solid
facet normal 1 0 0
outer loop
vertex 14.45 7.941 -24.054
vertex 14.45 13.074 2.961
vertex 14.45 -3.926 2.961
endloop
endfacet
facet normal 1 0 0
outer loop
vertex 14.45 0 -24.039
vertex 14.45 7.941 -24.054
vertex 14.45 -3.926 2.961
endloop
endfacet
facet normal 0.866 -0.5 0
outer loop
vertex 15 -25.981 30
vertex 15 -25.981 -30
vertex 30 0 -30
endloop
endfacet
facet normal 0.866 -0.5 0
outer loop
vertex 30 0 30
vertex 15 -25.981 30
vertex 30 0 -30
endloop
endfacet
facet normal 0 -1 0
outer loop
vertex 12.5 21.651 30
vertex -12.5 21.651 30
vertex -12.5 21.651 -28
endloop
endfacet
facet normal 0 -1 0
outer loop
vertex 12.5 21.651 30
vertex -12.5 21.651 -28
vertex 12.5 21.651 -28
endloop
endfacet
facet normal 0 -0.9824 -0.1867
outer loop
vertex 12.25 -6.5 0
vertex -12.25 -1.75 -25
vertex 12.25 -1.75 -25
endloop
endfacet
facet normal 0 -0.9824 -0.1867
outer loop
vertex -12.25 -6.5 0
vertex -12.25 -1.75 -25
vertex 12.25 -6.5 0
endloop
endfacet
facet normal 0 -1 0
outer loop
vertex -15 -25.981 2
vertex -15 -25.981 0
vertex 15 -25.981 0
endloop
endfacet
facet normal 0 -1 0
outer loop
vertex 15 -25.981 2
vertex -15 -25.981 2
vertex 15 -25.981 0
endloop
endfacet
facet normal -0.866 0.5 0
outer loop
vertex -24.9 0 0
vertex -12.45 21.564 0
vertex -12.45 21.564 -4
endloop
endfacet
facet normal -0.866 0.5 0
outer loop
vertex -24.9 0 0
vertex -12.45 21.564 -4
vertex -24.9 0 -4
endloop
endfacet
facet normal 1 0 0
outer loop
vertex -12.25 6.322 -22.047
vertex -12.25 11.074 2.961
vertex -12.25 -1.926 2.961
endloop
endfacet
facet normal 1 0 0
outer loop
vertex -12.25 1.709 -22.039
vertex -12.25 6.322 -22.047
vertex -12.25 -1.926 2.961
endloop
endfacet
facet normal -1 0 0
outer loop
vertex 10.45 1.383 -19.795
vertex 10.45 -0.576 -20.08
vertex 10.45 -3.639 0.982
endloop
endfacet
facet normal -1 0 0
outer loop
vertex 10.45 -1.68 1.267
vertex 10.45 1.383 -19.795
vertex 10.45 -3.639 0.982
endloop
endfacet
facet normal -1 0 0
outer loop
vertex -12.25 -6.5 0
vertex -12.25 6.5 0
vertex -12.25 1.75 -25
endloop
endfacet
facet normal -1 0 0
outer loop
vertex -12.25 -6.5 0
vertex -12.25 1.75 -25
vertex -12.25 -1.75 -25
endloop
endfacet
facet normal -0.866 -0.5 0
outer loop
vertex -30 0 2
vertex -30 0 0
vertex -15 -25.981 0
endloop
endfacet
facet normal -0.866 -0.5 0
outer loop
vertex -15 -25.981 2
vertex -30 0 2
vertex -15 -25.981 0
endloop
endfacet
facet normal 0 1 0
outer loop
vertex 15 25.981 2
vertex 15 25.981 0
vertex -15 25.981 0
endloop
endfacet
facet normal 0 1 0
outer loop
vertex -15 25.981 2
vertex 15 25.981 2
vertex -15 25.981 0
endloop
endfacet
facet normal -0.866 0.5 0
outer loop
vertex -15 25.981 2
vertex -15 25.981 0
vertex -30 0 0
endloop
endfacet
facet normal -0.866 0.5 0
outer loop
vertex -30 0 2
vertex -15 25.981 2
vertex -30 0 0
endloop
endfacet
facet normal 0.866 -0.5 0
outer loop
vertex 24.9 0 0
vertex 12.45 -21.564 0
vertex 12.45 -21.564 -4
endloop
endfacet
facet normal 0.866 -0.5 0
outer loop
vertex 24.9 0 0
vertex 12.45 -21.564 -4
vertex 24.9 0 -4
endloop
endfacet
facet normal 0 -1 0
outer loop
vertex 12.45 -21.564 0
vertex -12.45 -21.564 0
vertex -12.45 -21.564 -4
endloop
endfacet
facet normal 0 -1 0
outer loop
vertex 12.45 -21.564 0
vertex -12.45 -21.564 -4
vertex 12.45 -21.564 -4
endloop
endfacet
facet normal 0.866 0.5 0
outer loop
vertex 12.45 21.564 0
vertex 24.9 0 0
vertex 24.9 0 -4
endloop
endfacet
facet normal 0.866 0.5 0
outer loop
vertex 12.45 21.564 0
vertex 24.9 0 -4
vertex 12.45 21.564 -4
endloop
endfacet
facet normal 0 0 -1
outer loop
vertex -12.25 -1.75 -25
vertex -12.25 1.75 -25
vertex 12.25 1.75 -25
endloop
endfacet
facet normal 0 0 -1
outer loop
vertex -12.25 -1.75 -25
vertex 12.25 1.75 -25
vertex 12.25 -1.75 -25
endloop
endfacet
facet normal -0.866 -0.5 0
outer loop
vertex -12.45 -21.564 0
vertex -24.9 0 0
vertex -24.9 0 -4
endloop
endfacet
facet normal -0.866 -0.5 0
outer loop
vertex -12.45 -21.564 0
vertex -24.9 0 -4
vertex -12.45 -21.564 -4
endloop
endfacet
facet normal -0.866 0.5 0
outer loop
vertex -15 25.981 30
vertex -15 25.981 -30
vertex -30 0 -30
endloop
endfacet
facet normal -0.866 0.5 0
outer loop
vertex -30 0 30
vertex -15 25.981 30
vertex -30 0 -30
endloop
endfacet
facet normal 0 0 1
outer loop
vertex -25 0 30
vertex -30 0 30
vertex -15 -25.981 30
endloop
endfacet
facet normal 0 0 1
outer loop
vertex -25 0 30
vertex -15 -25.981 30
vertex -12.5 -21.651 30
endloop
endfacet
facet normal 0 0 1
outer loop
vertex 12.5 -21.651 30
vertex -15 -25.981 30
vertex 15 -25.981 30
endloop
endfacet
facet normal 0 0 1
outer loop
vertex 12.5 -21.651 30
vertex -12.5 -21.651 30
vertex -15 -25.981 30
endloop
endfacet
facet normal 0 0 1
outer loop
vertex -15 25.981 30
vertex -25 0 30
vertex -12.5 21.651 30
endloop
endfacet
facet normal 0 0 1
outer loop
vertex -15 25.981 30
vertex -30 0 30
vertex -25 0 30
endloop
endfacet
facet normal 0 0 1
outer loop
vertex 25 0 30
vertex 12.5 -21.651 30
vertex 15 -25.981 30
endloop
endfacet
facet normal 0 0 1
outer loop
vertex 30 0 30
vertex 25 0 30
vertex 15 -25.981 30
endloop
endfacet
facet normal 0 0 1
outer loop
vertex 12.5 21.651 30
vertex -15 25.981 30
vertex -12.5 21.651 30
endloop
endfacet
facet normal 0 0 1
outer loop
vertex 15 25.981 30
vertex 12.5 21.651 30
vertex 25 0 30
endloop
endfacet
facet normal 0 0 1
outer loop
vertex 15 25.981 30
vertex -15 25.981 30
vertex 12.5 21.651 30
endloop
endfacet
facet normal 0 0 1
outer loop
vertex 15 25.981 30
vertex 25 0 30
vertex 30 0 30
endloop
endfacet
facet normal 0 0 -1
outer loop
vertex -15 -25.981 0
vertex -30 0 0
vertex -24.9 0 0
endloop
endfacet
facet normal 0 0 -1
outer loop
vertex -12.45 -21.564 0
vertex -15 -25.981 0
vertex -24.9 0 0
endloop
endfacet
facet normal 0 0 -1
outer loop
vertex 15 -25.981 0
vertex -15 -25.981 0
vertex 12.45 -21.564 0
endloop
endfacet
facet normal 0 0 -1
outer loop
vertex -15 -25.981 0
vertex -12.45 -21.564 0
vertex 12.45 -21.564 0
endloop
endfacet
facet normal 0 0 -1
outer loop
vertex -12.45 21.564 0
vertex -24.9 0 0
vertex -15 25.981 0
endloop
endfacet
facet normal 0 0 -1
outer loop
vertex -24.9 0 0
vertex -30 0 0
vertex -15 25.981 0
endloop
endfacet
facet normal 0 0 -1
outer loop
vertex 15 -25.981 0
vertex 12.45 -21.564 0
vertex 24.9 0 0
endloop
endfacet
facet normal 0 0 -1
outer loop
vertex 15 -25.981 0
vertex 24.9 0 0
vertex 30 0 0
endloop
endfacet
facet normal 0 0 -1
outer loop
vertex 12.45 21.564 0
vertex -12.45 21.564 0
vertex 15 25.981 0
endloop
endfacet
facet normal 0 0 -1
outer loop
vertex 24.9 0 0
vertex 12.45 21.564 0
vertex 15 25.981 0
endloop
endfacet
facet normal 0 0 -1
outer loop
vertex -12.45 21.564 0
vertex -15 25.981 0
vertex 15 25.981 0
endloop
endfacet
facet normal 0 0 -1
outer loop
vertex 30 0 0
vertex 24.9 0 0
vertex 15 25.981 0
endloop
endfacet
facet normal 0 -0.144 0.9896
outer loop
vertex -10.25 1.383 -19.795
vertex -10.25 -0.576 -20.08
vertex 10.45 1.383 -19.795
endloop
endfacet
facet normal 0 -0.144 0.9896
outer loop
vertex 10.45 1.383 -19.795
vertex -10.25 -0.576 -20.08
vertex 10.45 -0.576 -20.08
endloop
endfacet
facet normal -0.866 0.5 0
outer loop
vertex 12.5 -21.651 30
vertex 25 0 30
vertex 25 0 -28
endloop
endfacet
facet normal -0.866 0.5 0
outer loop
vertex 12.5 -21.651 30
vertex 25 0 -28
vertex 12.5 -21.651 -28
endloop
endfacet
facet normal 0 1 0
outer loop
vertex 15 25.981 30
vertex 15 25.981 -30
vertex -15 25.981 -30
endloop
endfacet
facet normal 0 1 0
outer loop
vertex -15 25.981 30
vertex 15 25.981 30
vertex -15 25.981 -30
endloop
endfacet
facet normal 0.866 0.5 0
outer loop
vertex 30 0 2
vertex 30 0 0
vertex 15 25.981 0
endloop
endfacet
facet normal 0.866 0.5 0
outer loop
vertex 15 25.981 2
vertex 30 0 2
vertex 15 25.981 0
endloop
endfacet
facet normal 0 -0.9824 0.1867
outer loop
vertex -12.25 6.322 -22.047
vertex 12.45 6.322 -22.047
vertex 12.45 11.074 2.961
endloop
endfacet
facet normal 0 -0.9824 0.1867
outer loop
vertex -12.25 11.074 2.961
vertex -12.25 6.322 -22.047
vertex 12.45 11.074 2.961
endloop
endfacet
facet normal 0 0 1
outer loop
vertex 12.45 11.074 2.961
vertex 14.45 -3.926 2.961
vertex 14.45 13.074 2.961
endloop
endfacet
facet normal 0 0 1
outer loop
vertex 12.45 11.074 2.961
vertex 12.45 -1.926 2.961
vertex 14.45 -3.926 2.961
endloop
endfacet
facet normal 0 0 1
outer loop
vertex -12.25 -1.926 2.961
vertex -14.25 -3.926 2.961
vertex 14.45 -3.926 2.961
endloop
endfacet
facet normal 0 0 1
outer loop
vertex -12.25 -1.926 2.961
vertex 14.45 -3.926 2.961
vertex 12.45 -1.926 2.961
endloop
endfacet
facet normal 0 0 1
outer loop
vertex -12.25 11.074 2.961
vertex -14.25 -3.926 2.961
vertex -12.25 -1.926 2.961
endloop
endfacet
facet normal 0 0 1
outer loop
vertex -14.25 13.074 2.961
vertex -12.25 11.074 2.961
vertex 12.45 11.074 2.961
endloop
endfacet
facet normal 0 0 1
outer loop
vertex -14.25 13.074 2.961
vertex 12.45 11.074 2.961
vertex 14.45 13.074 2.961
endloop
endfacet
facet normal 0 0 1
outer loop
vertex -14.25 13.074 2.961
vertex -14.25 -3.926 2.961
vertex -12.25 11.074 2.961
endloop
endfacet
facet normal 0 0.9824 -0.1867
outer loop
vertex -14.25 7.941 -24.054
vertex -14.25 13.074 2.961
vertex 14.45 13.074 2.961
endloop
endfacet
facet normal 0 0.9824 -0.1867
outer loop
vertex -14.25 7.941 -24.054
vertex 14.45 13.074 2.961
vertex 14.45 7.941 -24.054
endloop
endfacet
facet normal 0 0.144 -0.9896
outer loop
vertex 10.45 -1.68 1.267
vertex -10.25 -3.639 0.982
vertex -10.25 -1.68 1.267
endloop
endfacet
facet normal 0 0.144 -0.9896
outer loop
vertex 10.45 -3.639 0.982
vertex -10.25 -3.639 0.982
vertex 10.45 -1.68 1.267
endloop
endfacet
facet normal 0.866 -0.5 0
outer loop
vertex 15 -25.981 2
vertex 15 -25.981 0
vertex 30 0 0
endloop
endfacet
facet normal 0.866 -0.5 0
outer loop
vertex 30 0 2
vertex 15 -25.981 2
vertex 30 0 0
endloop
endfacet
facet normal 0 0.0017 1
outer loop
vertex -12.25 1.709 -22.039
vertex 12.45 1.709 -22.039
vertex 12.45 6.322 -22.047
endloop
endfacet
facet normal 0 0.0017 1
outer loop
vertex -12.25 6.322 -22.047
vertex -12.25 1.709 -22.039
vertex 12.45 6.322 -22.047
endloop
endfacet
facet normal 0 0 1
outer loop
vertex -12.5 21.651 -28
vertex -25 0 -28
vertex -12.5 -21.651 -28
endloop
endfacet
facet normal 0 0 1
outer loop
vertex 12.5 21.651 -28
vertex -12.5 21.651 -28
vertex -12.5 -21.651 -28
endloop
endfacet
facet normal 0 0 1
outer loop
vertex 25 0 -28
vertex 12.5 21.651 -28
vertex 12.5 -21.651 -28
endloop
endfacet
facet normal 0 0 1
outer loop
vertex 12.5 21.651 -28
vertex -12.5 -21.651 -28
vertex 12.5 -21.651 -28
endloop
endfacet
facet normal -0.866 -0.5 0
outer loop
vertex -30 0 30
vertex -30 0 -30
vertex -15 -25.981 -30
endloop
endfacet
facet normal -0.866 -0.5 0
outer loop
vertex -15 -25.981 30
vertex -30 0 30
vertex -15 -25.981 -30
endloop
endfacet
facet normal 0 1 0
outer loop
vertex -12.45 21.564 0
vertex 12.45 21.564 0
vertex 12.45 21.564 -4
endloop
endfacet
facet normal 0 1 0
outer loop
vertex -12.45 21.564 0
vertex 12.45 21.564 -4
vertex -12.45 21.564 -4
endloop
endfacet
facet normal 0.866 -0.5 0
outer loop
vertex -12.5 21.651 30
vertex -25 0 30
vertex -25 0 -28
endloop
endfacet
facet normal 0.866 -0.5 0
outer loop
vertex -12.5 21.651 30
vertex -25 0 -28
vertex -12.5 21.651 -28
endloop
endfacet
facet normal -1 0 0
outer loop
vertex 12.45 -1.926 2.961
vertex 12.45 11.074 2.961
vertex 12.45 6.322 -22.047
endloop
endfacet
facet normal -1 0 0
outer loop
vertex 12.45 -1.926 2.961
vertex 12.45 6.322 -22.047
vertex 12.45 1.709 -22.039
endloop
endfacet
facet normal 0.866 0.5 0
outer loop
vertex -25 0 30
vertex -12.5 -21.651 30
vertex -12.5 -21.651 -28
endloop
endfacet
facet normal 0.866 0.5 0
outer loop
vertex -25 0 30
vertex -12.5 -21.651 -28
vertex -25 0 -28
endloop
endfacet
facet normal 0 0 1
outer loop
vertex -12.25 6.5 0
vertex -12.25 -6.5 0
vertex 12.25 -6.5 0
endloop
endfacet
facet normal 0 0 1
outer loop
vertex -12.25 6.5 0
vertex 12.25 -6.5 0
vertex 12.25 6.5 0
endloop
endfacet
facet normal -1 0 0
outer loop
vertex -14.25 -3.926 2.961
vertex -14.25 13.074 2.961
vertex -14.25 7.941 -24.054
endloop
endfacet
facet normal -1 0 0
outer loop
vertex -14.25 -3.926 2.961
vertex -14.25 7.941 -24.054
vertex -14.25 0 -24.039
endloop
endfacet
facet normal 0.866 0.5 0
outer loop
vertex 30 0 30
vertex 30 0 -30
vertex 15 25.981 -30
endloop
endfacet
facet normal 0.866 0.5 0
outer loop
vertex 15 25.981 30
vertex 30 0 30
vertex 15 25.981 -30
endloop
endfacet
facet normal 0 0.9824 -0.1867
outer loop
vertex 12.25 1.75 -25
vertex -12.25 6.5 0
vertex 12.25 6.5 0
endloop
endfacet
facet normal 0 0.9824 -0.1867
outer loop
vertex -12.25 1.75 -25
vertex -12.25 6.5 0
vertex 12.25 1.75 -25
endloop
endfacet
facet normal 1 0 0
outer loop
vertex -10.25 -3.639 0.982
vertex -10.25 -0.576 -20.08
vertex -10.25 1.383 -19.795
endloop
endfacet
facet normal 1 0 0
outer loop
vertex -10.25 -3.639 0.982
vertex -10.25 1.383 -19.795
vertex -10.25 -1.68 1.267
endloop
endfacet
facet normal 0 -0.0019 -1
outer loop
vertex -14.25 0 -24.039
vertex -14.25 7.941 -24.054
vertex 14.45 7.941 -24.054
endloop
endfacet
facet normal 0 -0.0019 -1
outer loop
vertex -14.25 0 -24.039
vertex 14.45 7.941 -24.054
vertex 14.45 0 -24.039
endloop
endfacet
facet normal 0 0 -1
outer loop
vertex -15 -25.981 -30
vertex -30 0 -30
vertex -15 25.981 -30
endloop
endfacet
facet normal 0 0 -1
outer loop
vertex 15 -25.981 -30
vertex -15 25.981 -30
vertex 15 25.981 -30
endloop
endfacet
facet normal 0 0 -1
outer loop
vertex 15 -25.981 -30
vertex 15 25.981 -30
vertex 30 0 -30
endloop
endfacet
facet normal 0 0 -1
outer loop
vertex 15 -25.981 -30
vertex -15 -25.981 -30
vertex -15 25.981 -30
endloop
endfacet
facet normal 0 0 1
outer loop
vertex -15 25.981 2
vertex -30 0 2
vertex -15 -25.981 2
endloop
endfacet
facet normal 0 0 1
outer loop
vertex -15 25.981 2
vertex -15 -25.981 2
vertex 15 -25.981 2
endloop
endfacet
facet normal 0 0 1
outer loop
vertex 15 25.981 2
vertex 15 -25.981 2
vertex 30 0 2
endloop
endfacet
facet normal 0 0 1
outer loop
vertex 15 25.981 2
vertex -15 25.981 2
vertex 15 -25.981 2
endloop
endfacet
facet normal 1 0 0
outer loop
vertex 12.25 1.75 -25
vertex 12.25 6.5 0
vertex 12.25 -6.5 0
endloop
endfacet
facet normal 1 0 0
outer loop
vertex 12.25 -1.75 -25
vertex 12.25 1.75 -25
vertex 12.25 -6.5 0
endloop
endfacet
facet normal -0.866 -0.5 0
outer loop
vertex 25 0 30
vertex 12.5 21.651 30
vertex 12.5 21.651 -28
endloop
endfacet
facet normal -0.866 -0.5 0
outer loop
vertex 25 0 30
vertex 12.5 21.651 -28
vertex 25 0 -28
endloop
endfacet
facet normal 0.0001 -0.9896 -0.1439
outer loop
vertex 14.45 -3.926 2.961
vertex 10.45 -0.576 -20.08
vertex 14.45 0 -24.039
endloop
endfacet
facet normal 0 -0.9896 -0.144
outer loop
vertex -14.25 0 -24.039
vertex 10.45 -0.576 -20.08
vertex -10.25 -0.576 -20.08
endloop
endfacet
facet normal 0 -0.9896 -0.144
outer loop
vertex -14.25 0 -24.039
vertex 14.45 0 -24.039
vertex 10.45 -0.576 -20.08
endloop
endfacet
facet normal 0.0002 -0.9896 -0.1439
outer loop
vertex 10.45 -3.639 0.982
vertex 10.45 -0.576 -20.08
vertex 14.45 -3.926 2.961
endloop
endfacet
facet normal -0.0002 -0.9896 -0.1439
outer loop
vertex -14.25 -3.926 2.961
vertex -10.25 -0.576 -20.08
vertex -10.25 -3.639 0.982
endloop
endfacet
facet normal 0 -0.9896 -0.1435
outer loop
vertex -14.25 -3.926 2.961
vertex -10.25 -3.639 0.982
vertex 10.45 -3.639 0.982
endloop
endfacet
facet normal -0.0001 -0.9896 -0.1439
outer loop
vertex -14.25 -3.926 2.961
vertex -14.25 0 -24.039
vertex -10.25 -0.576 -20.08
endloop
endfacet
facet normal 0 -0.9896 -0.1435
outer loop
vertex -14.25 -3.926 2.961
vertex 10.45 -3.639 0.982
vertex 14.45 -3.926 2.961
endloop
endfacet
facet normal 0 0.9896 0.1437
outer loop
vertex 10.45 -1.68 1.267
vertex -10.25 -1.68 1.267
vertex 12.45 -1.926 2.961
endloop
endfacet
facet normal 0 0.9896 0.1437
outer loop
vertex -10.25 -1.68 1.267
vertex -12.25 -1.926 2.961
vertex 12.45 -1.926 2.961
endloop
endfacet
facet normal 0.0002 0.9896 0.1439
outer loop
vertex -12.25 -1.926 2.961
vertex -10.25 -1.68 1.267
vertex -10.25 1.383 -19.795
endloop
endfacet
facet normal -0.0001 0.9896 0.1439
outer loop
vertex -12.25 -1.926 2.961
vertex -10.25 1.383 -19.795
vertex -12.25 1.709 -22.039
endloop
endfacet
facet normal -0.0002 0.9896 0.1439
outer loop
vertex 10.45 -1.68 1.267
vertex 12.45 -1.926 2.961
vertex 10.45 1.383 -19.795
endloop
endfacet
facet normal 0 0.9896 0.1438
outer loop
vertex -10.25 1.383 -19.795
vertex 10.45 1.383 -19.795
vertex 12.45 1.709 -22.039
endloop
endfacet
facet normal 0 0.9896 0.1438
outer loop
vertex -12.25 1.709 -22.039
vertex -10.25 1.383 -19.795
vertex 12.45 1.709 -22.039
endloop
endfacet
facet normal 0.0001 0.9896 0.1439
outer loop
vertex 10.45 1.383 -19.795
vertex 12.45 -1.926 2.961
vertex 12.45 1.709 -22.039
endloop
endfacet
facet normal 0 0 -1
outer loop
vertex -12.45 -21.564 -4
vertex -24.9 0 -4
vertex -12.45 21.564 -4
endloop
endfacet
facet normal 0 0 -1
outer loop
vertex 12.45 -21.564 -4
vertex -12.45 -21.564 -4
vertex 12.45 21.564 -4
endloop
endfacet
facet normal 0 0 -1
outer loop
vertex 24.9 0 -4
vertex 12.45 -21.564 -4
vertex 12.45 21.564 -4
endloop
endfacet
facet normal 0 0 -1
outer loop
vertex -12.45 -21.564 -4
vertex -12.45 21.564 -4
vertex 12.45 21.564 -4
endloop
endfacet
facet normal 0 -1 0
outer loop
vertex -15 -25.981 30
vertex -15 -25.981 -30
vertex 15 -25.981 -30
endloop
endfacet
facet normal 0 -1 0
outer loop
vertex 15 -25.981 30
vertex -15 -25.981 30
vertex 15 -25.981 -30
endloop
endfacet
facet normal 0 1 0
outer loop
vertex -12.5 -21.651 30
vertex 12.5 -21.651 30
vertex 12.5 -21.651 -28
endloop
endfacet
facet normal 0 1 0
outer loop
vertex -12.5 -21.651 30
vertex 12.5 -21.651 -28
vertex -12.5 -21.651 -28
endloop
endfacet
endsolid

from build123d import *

# Parameters (mm, degrees)
F1_DEPTH  = 30
F4_DEPTH  = 2
F6_DEPTH  = 4
F7_DEPTH  = 2
F13_DEPTH = 24.5
F15_DEPTH = 24.7
F16_DEPTH = 2
F17_DEPTH = 2
F20_DEPTH = 2
F22_W     = 20.7
F22_H     = 21.2839984947
F23_DEPTH = 1.9791820473


with BuildPart() as f1:
    # F0 (on Top) → F1 (new body, symmetric)
    with BuildSketch(Plane.XY):
        Polygon((15, -25.9807621135), (30, 0), (15, 25.9807621135), (-15, 25.9807621135), (-30, 0), (-15, -25.9807621135), align=None)
        Polygon((-12.5, -21.6506350946), (-25, 0), (-12.5, 21.6506350946), (12.5, 21.6506350946), (25, 0), (12.5, -21.6506350946), align=None, mode=Mode.SUBTRACT)
    extrude(amount=F1_DEPTH, both=True)

    # F3 (on 3pt) → F4 (join)
    with BuildSketch(Plane(origin=(0, 0, -30), x_dir=(1, 0, 0), z_dir=(0, 0, -1))):
        Polygon((-25, 0), (-12.5, -21.6506350946), (12.5, -21.6506350946), (25, 0), (12.5, 21.6506350946), (-12.5, 21.6506350946), align=None)
    extrude(amount=-F4_DEPTH)


with BuildPart() as f6:
    # F5 (on Top) → F6 (new body)
    with BuildSketch(Plane.XY):
        Polygon((-12.45, 21.5640325542), (-24.9, 0), (-12.45, -21.5640325542), (12.45, -21.5640325542), (24.9, 0), (12.45, 21.5640325542), align=None)
    extrude(amount=-F6_DEPTH)

    # F5 (on Top) → F7 (join)
    with BuildSketch(Plane.XY):
        Polygon((15, -25.9807621135), (30, 0), (15, 25.9807621135), (-15, 25.9807621135), (-30, 0), (-15, -25.9807621135), align=None)
        Polygon((-12.45, -21.5640325542), (-24.9, 0), (-12.45, 21.5640325542), (12.45, 21.5640325542), (24.9, 0), (12.45, -21.5640325542), align=None, mode=Mode.SUBTRACT)
        Polygon((-12.45, 21.5640325542), (-24.9, 0), (-12.45, -21.5640325542), (12.45, -21.5640325542), (24.9, 0), (12.45, 21.5640325542), align=None)
    extrude(amount=F7_DEPTH)


with BuildPart() as f13:
    # F12 (on 3pt) → F13 (new body)
    with BuildSketch(Plane(origin=(-12.25, 0, 0), x_dir=(0, -1, 0), z_dir=(-1, 0, 0))):
        Polygon((6.5, 0), (-6.5, 0), (-1.75, -25), (1.75, -25), align=None)
    extrude(amount=-F13_DEPTH)


with BuildPart() as f15:
    # F14 (on 3pt) → F15 (new body)
    with BuildSketch(Plane(origin=(-12.25, 0, 0), x_dir=(0, -1, 0), z_dir=(-1, 0, 0))):
        Polygon((-6.321952302, -22.0473393536), (-11.073605489, 2.9613616306), (-13.073605489, 2.9613616306), (-7.9407595883, -24.0536167943), (0, -24.0386383694), (3.926394511, 2.9613616306), (1.926394511, 2.9613616306), (-1.7091559621, -22.0386383694), align=None)
    extrude(amount=-F15_DEPTH)

    # F16 (add): a face of the model
    f16_faces = [f15.faces().sort_by_distance(p)[0] for p in [
        (-12.25, -0.4244847403, -9.5845721632),
    ]]
    extrude(f16_faces, amount=F16_DEPTH)

    # F14 (on 3pt) → F17 (join)
    with BuildSketch(Plane(origin=(-12.25, 0, 0), x_dir=(0, -1, 0), z_dir=(-1, 0, 0))):
        Polygon((1.926394511, 2.9613616306), (-11.073605489, 2.9613616306), (-6.321952302, -22.0473393536), (-1.7091559621, -22.0386383694), align=None)
        Polygon((-6.321952302, -22.0473393536), (-11.073605489, 2.9613616306), (-13.073605489, 2.9613616306), (-7.9407595883, -24.0536167943), (0, -24.0386383694), (3.926394511, 2.9613616306), (1.926394511, 2.9613616306), (-1.7091559621, -22.0386383694), align=None)
    extrude(amount=F17_DEPTH)

    # F19 (on 3pt) → F20 (join)
    with BuildSketch(Plane(origin=(12.45, 0, 0), x_dir=(0, -1, 0), z_dir=(-1, 0, 0))):
        Polygon((3.926394511, 2.9613616306), (-13.073605489, 2.9613616306), (-7.9407595883, -24.0536167943), (0, -24.0386383694), align=None)
    extrude(amount=-F20_DEPTH)

    # F22 (on 3pt) → F23 (cut, through all)
    with BuildSketch(Plane(origin=(0, -3.4233517746, -0.4978307266), x_dir=(1, 0, 0), z_dir=(0, -0.9895910237, -0.1439083246))):
        with Locations((0.1, -9.1464215042)):
            Rectangle(F22_W, F22_H)
    extrude(amount=-F23_DEPTH, mode=Mode.SUBTRACT)


solid = Compound([f1.part, f6.part, f13.part, f15.part])
